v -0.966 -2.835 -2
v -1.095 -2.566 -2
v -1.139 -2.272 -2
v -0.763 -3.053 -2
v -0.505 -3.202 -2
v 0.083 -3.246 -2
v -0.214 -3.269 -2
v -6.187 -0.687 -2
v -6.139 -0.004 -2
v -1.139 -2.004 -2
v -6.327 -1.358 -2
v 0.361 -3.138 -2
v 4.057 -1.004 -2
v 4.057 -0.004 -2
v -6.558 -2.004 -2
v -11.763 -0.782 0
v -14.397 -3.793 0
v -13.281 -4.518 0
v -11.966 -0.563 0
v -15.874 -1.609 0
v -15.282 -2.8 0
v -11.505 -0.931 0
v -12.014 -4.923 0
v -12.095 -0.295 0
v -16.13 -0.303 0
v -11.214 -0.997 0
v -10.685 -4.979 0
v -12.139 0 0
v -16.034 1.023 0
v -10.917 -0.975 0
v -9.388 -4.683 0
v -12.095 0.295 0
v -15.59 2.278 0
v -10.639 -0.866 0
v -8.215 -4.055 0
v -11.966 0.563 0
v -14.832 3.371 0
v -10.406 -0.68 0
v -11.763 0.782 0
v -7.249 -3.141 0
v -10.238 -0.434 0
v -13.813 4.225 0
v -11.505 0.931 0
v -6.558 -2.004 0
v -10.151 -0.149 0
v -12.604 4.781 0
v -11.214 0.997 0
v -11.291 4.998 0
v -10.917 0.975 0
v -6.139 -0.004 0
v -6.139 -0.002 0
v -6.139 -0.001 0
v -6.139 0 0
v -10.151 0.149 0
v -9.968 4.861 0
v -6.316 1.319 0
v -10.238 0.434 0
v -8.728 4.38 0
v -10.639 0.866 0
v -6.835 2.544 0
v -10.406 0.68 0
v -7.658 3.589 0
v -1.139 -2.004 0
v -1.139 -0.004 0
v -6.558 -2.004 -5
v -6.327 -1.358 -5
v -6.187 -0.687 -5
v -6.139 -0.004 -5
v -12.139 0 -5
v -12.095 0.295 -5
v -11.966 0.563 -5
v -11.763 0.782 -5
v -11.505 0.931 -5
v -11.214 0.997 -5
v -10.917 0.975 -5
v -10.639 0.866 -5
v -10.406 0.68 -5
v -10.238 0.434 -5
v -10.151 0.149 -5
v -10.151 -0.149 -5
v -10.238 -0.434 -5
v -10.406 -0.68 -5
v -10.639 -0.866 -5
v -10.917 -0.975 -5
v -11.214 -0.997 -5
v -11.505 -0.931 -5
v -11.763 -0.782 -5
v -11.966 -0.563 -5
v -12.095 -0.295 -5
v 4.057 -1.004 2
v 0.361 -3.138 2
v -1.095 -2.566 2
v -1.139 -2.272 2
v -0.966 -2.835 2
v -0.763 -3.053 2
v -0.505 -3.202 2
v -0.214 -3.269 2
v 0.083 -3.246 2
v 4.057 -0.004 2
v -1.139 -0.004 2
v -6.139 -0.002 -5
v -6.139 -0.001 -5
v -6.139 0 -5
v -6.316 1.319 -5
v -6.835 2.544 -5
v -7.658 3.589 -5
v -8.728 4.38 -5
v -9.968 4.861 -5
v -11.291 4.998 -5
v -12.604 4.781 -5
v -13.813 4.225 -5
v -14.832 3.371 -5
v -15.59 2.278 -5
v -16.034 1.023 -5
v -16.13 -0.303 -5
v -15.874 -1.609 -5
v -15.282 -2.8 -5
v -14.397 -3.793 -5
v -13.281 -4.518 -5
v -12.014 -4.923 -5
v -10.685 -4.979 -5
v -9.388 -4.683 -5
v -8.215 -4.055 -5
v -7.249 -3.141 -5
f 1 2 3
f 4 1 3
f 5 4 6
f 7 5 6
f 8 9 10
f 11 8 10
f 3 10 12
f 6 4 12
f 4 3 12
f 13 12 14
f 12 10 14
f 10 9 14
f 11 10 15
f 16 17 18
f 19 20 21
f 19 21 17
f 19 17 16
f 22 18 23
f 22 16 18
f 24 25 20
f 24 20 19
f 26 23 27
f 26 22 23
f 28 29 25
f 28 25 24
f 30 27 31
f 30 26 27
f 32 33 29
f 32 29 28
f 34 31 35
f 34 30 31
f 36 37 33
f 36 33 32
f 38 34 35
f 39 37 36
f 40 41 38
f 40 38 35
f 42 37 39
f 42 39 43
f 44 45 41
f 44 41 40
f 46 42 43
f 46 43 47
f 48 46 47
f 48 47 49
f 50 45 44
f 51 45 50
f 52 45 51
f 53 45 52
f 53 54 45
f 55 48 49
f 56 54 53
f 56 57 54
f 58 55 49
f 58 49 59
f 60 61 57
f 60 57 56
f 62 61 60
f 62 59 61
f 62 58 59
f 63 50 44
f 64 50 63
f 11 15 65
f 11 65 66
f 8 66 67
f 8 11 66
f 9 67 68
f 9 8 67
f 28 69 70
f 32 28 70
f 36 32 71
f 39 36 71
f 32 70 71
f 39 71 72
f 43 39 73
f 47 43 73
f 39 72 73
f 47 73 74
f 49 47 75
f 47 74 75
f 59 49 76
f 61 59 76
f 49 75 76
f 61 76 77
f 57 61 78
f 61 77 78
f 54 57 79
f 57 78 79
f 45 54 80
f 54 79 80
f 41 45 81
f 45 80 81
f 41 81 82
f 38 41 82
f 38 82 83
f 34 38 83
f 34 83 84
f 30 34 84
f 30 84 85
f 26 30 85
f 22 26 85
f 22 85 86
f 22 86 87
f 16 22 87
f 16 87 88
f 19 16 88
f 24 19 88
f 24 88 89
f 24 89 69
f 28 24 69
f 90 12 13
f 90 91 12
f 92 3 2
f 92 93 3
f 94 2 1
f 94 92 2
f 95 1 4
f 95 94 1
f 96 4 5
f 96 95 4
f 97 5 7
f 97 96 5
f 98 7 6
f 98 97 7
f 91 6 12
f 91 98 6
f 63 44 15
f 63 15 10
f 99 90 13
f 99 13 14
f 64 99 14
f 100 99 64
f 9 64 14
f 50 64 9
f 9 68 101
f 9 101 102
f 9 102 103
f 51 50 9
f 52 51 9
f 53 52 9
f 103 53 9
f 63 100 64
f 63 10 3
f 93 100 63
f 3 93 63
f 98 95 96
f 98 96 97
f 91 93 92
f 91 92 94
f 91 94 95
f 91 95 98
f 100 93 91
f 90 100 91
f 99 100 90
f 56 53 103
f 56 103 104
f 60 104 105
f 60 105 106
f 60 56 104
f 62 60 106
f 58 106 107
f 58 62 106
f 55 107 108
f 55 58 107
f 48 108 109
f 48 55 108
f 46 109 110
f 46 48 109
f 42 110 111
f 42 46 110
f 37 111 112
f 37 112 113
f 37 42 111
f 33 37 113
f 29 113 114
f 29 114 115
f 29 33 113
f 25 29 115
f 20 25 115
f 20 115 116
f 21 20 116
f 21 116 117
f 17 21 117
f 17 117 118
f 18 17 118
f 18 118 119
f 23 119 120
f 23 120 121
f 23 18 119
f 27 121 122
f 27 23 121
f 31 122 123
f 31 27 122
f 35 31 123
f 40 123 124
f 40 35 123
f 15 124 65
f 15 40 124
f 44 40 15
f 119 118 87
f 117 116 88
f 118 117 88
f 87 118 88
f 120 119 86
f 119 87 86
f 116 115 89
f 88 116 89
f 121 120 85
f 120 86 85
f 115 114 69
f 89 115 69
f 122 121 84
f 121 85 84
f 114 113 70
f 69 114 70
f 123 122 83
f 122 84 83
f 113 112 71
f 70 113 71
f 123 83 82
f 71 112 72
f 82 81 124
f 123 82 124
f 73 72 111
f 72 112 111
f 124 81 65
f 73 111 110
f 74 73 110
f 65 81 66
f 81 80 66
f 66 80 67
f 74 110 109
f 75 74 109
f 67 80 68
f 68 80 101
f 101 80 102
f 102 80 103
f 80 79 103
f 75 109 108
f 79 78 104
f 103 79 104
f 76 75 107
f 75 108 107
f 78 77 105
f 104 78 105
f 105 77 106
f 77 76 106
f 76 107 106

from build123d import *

# Parameters (mm, degrees)
F1_DEPTH = 5
F2_DEPTH = 2
F3_DEPTH = 2
F4_R     = 1
F5_D     = 2


with BuildPart() as f1:
    # F0 (on Top) → F1 (new body)
    with BuildSketch(Plane.XY):
        with BuildLine():
            ThreePointArc((-6.139429, -0.003584), (-6.139428, -0.001792), (-6.139428, 0))
            ThreePointArc((-6.139428, 0), (-16.03356, 1.023463), (-6.558418, -2.003584))
            ThreePointArc((-6.558418, -2.003584), (-6.245664, -1.025217), (-6.139429, -0.003584))
        make_face()
    extrude(amount=-F1_DEPTH)

    # F0 (on Top) → F2 (join)
    with BuildSketch(Plane.XY):
        with BuildLine():
            ThreePointArc((-6.139429, -0.003584), (-6.245664, -1.025217), (-6.558418, -2.003584))
            Line((-6.558418, -2.003584), (-1.139429, -2.003584))
            Line((-1.139429, -2.003584), (-1.139429, -0.003584))
            Line((-1.139429, -0.003584), (-6.139429, -0.003584))
        make_face()
    extrude(amount=-F2_DEPTH)

    # F0 (on Top) → F3 (join, symmetric)
    with BuildSketch(Plane.XY):
        Polygon((-1.139429, -0.003584), (-1.139429, -2.003584), (-1.139429, -4.003584), (4.056571, -1.003584), (4.056571, -0.003584), align=None)
    extrude(amount=F3_DEPTH, both=True)

    # F4
    f4_edges = [f1.edges().sort_by_distance(p)[0] for p in [
        (-1.139429, -4.003584, 0),
    ]]
    fillet(f4_edges, radius=F4_R)

    # F5 (through all)
    with Locations(Plane.XY):
        with Locations((-11.139428, 0)):
            Hole(F5_D / 2)


solid = f1.part
